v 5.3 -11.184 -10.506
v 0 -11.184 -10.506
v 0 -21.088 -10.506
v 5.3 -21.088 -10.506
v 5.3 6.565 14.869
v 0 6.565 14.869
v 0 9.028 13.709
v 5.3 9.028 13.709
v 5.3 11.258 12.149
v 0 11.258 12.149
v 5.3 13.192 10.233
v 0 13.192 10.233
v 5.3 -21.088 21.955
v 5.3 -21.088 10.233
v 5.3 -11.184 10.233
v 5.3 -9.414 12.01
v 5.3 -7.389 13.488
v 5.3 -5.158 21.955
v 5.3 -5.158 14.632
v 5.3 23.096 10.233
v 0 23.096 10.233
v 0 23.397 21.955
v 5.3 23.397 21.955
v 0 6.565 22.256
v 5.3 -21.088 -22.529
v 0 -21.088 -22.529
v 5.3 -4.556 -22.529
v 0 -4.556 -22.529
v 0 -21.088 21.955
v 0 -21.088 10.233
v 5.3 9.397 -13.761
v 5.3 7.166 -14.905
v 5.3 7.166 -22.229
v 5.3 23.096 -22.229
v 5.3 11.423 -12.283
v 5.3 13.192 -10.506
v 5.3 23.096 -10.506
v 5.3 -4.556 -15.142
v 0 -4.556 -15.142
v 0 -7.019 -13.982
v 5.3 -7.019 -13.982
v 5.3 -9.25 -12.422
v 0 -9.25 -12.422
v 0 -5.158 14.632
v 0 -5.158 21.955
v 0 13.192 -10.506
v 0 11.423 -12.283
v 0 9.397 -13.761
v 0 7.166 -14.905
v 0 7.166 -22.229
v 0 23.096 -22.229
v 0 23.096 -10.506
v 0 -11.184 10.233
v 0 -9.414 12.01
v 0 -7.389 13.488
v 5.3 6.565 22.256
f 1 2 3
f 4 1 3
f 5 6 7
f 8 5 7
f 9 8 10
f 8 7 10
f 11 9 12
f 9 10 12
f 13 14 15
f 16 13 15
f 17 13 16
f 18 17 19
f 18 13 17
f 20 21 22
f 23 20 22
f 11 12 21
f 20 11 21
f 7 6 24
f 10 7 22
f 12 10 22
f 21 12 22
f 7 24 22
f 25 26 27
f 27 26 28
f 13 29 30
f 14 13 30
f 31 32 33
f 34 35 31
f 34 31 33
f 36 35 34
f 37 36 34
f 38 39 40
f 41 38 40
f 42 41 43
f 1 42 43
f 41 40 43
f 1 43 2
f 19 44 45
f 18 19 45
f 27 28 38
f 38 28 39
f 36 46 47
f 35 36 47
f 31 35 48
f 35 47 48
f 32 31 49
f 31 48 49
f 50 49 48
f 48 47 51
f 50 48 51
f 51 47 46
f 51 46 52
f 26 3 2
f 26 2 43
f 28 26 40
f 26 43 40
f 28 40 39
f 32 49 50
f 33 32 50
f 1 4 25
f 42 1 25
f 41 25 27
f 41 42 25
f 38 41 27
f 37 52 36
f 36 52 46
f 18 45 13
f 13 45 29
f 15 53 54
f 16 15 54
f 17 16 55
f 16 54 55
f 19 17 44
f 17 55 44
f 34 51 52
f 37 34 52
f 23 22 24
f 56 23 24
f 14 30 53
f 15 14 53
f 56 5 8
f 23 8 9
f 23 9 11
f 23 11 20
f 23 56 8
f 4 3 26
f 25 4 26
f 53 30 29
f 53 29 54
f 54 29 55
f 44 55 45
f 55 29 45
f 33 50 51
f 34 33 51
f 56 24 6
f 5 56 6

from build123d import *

# Parameters (mm, degrees)
F1_DEPTH = 5.3


with BuildPart() as f1:
    # F0 (on Right) → F1 (new body)
    with BuildSketch(Plane.YZ):
        with BuildLine():
            ThreePointArc((6.564778, 14.86869), (10.176178, 12.976507), (13.192209, 10.233128))
            Line((13.192209, 10.233128), (23.096268, 10.233128))
            Line((23.096268, 10.233128), (23.396839, 21.955458))
            Line((23.396839, 21.955458), (6.564778, 22.256029))
            Line((6.564778, 22.256029), (6.564778, 14.86869))
        make_face()
        with BuildLine():
            ThreePointArc((-11.183836, 10.233128), (-8.430641, 12.788688), (-5.15755, 14.632013))
            Line((-5.15755, 14.632013), (-5.15755, 21.955458))
            Line((-5.15755, 21.955458), (-21.087895, 21.955458))
            Line((-21.087895, 21.955458), (-21.087895, 10.233128))
            Line((-21.087895, 10.233128), (-11.183836, 10.233128))
        make_face()
        with BuildLine():
            Line((23.096268, -10.506376), (13.192209, -10.506376))
            ThreePointArc((13.192209, -10.506376), (10.439013, -13.061935), (7.165923, -14.905261))
            Line((7.165923, -14.905261), (7.165923, -22.228706))
            Line((7.165923, -22.228706), (23.096268, -22.228706))
            Line((23.096268, -22.228706), (23.096268, -10.506376))
        make_face()
        with BuildLine():
            Line((-4.556405, -22.529277), (-4.556405, -15.141938))
            ThreePointArc((-4.556405, -15.141938), (-8.167805, -13.249755), (-11.183836, -10.506376))
            Line((-11.183836, -10.506376), (-21.087895, -10.506376))
            Line((-21.087895, -10.506376), (-21.087895, -22.529277))
            Line((-21.087895, -22.529277), (-4.556405, -22.529277))
        make_face()
    extrude(amount=F1_DEPTH)


solid = f1.part
